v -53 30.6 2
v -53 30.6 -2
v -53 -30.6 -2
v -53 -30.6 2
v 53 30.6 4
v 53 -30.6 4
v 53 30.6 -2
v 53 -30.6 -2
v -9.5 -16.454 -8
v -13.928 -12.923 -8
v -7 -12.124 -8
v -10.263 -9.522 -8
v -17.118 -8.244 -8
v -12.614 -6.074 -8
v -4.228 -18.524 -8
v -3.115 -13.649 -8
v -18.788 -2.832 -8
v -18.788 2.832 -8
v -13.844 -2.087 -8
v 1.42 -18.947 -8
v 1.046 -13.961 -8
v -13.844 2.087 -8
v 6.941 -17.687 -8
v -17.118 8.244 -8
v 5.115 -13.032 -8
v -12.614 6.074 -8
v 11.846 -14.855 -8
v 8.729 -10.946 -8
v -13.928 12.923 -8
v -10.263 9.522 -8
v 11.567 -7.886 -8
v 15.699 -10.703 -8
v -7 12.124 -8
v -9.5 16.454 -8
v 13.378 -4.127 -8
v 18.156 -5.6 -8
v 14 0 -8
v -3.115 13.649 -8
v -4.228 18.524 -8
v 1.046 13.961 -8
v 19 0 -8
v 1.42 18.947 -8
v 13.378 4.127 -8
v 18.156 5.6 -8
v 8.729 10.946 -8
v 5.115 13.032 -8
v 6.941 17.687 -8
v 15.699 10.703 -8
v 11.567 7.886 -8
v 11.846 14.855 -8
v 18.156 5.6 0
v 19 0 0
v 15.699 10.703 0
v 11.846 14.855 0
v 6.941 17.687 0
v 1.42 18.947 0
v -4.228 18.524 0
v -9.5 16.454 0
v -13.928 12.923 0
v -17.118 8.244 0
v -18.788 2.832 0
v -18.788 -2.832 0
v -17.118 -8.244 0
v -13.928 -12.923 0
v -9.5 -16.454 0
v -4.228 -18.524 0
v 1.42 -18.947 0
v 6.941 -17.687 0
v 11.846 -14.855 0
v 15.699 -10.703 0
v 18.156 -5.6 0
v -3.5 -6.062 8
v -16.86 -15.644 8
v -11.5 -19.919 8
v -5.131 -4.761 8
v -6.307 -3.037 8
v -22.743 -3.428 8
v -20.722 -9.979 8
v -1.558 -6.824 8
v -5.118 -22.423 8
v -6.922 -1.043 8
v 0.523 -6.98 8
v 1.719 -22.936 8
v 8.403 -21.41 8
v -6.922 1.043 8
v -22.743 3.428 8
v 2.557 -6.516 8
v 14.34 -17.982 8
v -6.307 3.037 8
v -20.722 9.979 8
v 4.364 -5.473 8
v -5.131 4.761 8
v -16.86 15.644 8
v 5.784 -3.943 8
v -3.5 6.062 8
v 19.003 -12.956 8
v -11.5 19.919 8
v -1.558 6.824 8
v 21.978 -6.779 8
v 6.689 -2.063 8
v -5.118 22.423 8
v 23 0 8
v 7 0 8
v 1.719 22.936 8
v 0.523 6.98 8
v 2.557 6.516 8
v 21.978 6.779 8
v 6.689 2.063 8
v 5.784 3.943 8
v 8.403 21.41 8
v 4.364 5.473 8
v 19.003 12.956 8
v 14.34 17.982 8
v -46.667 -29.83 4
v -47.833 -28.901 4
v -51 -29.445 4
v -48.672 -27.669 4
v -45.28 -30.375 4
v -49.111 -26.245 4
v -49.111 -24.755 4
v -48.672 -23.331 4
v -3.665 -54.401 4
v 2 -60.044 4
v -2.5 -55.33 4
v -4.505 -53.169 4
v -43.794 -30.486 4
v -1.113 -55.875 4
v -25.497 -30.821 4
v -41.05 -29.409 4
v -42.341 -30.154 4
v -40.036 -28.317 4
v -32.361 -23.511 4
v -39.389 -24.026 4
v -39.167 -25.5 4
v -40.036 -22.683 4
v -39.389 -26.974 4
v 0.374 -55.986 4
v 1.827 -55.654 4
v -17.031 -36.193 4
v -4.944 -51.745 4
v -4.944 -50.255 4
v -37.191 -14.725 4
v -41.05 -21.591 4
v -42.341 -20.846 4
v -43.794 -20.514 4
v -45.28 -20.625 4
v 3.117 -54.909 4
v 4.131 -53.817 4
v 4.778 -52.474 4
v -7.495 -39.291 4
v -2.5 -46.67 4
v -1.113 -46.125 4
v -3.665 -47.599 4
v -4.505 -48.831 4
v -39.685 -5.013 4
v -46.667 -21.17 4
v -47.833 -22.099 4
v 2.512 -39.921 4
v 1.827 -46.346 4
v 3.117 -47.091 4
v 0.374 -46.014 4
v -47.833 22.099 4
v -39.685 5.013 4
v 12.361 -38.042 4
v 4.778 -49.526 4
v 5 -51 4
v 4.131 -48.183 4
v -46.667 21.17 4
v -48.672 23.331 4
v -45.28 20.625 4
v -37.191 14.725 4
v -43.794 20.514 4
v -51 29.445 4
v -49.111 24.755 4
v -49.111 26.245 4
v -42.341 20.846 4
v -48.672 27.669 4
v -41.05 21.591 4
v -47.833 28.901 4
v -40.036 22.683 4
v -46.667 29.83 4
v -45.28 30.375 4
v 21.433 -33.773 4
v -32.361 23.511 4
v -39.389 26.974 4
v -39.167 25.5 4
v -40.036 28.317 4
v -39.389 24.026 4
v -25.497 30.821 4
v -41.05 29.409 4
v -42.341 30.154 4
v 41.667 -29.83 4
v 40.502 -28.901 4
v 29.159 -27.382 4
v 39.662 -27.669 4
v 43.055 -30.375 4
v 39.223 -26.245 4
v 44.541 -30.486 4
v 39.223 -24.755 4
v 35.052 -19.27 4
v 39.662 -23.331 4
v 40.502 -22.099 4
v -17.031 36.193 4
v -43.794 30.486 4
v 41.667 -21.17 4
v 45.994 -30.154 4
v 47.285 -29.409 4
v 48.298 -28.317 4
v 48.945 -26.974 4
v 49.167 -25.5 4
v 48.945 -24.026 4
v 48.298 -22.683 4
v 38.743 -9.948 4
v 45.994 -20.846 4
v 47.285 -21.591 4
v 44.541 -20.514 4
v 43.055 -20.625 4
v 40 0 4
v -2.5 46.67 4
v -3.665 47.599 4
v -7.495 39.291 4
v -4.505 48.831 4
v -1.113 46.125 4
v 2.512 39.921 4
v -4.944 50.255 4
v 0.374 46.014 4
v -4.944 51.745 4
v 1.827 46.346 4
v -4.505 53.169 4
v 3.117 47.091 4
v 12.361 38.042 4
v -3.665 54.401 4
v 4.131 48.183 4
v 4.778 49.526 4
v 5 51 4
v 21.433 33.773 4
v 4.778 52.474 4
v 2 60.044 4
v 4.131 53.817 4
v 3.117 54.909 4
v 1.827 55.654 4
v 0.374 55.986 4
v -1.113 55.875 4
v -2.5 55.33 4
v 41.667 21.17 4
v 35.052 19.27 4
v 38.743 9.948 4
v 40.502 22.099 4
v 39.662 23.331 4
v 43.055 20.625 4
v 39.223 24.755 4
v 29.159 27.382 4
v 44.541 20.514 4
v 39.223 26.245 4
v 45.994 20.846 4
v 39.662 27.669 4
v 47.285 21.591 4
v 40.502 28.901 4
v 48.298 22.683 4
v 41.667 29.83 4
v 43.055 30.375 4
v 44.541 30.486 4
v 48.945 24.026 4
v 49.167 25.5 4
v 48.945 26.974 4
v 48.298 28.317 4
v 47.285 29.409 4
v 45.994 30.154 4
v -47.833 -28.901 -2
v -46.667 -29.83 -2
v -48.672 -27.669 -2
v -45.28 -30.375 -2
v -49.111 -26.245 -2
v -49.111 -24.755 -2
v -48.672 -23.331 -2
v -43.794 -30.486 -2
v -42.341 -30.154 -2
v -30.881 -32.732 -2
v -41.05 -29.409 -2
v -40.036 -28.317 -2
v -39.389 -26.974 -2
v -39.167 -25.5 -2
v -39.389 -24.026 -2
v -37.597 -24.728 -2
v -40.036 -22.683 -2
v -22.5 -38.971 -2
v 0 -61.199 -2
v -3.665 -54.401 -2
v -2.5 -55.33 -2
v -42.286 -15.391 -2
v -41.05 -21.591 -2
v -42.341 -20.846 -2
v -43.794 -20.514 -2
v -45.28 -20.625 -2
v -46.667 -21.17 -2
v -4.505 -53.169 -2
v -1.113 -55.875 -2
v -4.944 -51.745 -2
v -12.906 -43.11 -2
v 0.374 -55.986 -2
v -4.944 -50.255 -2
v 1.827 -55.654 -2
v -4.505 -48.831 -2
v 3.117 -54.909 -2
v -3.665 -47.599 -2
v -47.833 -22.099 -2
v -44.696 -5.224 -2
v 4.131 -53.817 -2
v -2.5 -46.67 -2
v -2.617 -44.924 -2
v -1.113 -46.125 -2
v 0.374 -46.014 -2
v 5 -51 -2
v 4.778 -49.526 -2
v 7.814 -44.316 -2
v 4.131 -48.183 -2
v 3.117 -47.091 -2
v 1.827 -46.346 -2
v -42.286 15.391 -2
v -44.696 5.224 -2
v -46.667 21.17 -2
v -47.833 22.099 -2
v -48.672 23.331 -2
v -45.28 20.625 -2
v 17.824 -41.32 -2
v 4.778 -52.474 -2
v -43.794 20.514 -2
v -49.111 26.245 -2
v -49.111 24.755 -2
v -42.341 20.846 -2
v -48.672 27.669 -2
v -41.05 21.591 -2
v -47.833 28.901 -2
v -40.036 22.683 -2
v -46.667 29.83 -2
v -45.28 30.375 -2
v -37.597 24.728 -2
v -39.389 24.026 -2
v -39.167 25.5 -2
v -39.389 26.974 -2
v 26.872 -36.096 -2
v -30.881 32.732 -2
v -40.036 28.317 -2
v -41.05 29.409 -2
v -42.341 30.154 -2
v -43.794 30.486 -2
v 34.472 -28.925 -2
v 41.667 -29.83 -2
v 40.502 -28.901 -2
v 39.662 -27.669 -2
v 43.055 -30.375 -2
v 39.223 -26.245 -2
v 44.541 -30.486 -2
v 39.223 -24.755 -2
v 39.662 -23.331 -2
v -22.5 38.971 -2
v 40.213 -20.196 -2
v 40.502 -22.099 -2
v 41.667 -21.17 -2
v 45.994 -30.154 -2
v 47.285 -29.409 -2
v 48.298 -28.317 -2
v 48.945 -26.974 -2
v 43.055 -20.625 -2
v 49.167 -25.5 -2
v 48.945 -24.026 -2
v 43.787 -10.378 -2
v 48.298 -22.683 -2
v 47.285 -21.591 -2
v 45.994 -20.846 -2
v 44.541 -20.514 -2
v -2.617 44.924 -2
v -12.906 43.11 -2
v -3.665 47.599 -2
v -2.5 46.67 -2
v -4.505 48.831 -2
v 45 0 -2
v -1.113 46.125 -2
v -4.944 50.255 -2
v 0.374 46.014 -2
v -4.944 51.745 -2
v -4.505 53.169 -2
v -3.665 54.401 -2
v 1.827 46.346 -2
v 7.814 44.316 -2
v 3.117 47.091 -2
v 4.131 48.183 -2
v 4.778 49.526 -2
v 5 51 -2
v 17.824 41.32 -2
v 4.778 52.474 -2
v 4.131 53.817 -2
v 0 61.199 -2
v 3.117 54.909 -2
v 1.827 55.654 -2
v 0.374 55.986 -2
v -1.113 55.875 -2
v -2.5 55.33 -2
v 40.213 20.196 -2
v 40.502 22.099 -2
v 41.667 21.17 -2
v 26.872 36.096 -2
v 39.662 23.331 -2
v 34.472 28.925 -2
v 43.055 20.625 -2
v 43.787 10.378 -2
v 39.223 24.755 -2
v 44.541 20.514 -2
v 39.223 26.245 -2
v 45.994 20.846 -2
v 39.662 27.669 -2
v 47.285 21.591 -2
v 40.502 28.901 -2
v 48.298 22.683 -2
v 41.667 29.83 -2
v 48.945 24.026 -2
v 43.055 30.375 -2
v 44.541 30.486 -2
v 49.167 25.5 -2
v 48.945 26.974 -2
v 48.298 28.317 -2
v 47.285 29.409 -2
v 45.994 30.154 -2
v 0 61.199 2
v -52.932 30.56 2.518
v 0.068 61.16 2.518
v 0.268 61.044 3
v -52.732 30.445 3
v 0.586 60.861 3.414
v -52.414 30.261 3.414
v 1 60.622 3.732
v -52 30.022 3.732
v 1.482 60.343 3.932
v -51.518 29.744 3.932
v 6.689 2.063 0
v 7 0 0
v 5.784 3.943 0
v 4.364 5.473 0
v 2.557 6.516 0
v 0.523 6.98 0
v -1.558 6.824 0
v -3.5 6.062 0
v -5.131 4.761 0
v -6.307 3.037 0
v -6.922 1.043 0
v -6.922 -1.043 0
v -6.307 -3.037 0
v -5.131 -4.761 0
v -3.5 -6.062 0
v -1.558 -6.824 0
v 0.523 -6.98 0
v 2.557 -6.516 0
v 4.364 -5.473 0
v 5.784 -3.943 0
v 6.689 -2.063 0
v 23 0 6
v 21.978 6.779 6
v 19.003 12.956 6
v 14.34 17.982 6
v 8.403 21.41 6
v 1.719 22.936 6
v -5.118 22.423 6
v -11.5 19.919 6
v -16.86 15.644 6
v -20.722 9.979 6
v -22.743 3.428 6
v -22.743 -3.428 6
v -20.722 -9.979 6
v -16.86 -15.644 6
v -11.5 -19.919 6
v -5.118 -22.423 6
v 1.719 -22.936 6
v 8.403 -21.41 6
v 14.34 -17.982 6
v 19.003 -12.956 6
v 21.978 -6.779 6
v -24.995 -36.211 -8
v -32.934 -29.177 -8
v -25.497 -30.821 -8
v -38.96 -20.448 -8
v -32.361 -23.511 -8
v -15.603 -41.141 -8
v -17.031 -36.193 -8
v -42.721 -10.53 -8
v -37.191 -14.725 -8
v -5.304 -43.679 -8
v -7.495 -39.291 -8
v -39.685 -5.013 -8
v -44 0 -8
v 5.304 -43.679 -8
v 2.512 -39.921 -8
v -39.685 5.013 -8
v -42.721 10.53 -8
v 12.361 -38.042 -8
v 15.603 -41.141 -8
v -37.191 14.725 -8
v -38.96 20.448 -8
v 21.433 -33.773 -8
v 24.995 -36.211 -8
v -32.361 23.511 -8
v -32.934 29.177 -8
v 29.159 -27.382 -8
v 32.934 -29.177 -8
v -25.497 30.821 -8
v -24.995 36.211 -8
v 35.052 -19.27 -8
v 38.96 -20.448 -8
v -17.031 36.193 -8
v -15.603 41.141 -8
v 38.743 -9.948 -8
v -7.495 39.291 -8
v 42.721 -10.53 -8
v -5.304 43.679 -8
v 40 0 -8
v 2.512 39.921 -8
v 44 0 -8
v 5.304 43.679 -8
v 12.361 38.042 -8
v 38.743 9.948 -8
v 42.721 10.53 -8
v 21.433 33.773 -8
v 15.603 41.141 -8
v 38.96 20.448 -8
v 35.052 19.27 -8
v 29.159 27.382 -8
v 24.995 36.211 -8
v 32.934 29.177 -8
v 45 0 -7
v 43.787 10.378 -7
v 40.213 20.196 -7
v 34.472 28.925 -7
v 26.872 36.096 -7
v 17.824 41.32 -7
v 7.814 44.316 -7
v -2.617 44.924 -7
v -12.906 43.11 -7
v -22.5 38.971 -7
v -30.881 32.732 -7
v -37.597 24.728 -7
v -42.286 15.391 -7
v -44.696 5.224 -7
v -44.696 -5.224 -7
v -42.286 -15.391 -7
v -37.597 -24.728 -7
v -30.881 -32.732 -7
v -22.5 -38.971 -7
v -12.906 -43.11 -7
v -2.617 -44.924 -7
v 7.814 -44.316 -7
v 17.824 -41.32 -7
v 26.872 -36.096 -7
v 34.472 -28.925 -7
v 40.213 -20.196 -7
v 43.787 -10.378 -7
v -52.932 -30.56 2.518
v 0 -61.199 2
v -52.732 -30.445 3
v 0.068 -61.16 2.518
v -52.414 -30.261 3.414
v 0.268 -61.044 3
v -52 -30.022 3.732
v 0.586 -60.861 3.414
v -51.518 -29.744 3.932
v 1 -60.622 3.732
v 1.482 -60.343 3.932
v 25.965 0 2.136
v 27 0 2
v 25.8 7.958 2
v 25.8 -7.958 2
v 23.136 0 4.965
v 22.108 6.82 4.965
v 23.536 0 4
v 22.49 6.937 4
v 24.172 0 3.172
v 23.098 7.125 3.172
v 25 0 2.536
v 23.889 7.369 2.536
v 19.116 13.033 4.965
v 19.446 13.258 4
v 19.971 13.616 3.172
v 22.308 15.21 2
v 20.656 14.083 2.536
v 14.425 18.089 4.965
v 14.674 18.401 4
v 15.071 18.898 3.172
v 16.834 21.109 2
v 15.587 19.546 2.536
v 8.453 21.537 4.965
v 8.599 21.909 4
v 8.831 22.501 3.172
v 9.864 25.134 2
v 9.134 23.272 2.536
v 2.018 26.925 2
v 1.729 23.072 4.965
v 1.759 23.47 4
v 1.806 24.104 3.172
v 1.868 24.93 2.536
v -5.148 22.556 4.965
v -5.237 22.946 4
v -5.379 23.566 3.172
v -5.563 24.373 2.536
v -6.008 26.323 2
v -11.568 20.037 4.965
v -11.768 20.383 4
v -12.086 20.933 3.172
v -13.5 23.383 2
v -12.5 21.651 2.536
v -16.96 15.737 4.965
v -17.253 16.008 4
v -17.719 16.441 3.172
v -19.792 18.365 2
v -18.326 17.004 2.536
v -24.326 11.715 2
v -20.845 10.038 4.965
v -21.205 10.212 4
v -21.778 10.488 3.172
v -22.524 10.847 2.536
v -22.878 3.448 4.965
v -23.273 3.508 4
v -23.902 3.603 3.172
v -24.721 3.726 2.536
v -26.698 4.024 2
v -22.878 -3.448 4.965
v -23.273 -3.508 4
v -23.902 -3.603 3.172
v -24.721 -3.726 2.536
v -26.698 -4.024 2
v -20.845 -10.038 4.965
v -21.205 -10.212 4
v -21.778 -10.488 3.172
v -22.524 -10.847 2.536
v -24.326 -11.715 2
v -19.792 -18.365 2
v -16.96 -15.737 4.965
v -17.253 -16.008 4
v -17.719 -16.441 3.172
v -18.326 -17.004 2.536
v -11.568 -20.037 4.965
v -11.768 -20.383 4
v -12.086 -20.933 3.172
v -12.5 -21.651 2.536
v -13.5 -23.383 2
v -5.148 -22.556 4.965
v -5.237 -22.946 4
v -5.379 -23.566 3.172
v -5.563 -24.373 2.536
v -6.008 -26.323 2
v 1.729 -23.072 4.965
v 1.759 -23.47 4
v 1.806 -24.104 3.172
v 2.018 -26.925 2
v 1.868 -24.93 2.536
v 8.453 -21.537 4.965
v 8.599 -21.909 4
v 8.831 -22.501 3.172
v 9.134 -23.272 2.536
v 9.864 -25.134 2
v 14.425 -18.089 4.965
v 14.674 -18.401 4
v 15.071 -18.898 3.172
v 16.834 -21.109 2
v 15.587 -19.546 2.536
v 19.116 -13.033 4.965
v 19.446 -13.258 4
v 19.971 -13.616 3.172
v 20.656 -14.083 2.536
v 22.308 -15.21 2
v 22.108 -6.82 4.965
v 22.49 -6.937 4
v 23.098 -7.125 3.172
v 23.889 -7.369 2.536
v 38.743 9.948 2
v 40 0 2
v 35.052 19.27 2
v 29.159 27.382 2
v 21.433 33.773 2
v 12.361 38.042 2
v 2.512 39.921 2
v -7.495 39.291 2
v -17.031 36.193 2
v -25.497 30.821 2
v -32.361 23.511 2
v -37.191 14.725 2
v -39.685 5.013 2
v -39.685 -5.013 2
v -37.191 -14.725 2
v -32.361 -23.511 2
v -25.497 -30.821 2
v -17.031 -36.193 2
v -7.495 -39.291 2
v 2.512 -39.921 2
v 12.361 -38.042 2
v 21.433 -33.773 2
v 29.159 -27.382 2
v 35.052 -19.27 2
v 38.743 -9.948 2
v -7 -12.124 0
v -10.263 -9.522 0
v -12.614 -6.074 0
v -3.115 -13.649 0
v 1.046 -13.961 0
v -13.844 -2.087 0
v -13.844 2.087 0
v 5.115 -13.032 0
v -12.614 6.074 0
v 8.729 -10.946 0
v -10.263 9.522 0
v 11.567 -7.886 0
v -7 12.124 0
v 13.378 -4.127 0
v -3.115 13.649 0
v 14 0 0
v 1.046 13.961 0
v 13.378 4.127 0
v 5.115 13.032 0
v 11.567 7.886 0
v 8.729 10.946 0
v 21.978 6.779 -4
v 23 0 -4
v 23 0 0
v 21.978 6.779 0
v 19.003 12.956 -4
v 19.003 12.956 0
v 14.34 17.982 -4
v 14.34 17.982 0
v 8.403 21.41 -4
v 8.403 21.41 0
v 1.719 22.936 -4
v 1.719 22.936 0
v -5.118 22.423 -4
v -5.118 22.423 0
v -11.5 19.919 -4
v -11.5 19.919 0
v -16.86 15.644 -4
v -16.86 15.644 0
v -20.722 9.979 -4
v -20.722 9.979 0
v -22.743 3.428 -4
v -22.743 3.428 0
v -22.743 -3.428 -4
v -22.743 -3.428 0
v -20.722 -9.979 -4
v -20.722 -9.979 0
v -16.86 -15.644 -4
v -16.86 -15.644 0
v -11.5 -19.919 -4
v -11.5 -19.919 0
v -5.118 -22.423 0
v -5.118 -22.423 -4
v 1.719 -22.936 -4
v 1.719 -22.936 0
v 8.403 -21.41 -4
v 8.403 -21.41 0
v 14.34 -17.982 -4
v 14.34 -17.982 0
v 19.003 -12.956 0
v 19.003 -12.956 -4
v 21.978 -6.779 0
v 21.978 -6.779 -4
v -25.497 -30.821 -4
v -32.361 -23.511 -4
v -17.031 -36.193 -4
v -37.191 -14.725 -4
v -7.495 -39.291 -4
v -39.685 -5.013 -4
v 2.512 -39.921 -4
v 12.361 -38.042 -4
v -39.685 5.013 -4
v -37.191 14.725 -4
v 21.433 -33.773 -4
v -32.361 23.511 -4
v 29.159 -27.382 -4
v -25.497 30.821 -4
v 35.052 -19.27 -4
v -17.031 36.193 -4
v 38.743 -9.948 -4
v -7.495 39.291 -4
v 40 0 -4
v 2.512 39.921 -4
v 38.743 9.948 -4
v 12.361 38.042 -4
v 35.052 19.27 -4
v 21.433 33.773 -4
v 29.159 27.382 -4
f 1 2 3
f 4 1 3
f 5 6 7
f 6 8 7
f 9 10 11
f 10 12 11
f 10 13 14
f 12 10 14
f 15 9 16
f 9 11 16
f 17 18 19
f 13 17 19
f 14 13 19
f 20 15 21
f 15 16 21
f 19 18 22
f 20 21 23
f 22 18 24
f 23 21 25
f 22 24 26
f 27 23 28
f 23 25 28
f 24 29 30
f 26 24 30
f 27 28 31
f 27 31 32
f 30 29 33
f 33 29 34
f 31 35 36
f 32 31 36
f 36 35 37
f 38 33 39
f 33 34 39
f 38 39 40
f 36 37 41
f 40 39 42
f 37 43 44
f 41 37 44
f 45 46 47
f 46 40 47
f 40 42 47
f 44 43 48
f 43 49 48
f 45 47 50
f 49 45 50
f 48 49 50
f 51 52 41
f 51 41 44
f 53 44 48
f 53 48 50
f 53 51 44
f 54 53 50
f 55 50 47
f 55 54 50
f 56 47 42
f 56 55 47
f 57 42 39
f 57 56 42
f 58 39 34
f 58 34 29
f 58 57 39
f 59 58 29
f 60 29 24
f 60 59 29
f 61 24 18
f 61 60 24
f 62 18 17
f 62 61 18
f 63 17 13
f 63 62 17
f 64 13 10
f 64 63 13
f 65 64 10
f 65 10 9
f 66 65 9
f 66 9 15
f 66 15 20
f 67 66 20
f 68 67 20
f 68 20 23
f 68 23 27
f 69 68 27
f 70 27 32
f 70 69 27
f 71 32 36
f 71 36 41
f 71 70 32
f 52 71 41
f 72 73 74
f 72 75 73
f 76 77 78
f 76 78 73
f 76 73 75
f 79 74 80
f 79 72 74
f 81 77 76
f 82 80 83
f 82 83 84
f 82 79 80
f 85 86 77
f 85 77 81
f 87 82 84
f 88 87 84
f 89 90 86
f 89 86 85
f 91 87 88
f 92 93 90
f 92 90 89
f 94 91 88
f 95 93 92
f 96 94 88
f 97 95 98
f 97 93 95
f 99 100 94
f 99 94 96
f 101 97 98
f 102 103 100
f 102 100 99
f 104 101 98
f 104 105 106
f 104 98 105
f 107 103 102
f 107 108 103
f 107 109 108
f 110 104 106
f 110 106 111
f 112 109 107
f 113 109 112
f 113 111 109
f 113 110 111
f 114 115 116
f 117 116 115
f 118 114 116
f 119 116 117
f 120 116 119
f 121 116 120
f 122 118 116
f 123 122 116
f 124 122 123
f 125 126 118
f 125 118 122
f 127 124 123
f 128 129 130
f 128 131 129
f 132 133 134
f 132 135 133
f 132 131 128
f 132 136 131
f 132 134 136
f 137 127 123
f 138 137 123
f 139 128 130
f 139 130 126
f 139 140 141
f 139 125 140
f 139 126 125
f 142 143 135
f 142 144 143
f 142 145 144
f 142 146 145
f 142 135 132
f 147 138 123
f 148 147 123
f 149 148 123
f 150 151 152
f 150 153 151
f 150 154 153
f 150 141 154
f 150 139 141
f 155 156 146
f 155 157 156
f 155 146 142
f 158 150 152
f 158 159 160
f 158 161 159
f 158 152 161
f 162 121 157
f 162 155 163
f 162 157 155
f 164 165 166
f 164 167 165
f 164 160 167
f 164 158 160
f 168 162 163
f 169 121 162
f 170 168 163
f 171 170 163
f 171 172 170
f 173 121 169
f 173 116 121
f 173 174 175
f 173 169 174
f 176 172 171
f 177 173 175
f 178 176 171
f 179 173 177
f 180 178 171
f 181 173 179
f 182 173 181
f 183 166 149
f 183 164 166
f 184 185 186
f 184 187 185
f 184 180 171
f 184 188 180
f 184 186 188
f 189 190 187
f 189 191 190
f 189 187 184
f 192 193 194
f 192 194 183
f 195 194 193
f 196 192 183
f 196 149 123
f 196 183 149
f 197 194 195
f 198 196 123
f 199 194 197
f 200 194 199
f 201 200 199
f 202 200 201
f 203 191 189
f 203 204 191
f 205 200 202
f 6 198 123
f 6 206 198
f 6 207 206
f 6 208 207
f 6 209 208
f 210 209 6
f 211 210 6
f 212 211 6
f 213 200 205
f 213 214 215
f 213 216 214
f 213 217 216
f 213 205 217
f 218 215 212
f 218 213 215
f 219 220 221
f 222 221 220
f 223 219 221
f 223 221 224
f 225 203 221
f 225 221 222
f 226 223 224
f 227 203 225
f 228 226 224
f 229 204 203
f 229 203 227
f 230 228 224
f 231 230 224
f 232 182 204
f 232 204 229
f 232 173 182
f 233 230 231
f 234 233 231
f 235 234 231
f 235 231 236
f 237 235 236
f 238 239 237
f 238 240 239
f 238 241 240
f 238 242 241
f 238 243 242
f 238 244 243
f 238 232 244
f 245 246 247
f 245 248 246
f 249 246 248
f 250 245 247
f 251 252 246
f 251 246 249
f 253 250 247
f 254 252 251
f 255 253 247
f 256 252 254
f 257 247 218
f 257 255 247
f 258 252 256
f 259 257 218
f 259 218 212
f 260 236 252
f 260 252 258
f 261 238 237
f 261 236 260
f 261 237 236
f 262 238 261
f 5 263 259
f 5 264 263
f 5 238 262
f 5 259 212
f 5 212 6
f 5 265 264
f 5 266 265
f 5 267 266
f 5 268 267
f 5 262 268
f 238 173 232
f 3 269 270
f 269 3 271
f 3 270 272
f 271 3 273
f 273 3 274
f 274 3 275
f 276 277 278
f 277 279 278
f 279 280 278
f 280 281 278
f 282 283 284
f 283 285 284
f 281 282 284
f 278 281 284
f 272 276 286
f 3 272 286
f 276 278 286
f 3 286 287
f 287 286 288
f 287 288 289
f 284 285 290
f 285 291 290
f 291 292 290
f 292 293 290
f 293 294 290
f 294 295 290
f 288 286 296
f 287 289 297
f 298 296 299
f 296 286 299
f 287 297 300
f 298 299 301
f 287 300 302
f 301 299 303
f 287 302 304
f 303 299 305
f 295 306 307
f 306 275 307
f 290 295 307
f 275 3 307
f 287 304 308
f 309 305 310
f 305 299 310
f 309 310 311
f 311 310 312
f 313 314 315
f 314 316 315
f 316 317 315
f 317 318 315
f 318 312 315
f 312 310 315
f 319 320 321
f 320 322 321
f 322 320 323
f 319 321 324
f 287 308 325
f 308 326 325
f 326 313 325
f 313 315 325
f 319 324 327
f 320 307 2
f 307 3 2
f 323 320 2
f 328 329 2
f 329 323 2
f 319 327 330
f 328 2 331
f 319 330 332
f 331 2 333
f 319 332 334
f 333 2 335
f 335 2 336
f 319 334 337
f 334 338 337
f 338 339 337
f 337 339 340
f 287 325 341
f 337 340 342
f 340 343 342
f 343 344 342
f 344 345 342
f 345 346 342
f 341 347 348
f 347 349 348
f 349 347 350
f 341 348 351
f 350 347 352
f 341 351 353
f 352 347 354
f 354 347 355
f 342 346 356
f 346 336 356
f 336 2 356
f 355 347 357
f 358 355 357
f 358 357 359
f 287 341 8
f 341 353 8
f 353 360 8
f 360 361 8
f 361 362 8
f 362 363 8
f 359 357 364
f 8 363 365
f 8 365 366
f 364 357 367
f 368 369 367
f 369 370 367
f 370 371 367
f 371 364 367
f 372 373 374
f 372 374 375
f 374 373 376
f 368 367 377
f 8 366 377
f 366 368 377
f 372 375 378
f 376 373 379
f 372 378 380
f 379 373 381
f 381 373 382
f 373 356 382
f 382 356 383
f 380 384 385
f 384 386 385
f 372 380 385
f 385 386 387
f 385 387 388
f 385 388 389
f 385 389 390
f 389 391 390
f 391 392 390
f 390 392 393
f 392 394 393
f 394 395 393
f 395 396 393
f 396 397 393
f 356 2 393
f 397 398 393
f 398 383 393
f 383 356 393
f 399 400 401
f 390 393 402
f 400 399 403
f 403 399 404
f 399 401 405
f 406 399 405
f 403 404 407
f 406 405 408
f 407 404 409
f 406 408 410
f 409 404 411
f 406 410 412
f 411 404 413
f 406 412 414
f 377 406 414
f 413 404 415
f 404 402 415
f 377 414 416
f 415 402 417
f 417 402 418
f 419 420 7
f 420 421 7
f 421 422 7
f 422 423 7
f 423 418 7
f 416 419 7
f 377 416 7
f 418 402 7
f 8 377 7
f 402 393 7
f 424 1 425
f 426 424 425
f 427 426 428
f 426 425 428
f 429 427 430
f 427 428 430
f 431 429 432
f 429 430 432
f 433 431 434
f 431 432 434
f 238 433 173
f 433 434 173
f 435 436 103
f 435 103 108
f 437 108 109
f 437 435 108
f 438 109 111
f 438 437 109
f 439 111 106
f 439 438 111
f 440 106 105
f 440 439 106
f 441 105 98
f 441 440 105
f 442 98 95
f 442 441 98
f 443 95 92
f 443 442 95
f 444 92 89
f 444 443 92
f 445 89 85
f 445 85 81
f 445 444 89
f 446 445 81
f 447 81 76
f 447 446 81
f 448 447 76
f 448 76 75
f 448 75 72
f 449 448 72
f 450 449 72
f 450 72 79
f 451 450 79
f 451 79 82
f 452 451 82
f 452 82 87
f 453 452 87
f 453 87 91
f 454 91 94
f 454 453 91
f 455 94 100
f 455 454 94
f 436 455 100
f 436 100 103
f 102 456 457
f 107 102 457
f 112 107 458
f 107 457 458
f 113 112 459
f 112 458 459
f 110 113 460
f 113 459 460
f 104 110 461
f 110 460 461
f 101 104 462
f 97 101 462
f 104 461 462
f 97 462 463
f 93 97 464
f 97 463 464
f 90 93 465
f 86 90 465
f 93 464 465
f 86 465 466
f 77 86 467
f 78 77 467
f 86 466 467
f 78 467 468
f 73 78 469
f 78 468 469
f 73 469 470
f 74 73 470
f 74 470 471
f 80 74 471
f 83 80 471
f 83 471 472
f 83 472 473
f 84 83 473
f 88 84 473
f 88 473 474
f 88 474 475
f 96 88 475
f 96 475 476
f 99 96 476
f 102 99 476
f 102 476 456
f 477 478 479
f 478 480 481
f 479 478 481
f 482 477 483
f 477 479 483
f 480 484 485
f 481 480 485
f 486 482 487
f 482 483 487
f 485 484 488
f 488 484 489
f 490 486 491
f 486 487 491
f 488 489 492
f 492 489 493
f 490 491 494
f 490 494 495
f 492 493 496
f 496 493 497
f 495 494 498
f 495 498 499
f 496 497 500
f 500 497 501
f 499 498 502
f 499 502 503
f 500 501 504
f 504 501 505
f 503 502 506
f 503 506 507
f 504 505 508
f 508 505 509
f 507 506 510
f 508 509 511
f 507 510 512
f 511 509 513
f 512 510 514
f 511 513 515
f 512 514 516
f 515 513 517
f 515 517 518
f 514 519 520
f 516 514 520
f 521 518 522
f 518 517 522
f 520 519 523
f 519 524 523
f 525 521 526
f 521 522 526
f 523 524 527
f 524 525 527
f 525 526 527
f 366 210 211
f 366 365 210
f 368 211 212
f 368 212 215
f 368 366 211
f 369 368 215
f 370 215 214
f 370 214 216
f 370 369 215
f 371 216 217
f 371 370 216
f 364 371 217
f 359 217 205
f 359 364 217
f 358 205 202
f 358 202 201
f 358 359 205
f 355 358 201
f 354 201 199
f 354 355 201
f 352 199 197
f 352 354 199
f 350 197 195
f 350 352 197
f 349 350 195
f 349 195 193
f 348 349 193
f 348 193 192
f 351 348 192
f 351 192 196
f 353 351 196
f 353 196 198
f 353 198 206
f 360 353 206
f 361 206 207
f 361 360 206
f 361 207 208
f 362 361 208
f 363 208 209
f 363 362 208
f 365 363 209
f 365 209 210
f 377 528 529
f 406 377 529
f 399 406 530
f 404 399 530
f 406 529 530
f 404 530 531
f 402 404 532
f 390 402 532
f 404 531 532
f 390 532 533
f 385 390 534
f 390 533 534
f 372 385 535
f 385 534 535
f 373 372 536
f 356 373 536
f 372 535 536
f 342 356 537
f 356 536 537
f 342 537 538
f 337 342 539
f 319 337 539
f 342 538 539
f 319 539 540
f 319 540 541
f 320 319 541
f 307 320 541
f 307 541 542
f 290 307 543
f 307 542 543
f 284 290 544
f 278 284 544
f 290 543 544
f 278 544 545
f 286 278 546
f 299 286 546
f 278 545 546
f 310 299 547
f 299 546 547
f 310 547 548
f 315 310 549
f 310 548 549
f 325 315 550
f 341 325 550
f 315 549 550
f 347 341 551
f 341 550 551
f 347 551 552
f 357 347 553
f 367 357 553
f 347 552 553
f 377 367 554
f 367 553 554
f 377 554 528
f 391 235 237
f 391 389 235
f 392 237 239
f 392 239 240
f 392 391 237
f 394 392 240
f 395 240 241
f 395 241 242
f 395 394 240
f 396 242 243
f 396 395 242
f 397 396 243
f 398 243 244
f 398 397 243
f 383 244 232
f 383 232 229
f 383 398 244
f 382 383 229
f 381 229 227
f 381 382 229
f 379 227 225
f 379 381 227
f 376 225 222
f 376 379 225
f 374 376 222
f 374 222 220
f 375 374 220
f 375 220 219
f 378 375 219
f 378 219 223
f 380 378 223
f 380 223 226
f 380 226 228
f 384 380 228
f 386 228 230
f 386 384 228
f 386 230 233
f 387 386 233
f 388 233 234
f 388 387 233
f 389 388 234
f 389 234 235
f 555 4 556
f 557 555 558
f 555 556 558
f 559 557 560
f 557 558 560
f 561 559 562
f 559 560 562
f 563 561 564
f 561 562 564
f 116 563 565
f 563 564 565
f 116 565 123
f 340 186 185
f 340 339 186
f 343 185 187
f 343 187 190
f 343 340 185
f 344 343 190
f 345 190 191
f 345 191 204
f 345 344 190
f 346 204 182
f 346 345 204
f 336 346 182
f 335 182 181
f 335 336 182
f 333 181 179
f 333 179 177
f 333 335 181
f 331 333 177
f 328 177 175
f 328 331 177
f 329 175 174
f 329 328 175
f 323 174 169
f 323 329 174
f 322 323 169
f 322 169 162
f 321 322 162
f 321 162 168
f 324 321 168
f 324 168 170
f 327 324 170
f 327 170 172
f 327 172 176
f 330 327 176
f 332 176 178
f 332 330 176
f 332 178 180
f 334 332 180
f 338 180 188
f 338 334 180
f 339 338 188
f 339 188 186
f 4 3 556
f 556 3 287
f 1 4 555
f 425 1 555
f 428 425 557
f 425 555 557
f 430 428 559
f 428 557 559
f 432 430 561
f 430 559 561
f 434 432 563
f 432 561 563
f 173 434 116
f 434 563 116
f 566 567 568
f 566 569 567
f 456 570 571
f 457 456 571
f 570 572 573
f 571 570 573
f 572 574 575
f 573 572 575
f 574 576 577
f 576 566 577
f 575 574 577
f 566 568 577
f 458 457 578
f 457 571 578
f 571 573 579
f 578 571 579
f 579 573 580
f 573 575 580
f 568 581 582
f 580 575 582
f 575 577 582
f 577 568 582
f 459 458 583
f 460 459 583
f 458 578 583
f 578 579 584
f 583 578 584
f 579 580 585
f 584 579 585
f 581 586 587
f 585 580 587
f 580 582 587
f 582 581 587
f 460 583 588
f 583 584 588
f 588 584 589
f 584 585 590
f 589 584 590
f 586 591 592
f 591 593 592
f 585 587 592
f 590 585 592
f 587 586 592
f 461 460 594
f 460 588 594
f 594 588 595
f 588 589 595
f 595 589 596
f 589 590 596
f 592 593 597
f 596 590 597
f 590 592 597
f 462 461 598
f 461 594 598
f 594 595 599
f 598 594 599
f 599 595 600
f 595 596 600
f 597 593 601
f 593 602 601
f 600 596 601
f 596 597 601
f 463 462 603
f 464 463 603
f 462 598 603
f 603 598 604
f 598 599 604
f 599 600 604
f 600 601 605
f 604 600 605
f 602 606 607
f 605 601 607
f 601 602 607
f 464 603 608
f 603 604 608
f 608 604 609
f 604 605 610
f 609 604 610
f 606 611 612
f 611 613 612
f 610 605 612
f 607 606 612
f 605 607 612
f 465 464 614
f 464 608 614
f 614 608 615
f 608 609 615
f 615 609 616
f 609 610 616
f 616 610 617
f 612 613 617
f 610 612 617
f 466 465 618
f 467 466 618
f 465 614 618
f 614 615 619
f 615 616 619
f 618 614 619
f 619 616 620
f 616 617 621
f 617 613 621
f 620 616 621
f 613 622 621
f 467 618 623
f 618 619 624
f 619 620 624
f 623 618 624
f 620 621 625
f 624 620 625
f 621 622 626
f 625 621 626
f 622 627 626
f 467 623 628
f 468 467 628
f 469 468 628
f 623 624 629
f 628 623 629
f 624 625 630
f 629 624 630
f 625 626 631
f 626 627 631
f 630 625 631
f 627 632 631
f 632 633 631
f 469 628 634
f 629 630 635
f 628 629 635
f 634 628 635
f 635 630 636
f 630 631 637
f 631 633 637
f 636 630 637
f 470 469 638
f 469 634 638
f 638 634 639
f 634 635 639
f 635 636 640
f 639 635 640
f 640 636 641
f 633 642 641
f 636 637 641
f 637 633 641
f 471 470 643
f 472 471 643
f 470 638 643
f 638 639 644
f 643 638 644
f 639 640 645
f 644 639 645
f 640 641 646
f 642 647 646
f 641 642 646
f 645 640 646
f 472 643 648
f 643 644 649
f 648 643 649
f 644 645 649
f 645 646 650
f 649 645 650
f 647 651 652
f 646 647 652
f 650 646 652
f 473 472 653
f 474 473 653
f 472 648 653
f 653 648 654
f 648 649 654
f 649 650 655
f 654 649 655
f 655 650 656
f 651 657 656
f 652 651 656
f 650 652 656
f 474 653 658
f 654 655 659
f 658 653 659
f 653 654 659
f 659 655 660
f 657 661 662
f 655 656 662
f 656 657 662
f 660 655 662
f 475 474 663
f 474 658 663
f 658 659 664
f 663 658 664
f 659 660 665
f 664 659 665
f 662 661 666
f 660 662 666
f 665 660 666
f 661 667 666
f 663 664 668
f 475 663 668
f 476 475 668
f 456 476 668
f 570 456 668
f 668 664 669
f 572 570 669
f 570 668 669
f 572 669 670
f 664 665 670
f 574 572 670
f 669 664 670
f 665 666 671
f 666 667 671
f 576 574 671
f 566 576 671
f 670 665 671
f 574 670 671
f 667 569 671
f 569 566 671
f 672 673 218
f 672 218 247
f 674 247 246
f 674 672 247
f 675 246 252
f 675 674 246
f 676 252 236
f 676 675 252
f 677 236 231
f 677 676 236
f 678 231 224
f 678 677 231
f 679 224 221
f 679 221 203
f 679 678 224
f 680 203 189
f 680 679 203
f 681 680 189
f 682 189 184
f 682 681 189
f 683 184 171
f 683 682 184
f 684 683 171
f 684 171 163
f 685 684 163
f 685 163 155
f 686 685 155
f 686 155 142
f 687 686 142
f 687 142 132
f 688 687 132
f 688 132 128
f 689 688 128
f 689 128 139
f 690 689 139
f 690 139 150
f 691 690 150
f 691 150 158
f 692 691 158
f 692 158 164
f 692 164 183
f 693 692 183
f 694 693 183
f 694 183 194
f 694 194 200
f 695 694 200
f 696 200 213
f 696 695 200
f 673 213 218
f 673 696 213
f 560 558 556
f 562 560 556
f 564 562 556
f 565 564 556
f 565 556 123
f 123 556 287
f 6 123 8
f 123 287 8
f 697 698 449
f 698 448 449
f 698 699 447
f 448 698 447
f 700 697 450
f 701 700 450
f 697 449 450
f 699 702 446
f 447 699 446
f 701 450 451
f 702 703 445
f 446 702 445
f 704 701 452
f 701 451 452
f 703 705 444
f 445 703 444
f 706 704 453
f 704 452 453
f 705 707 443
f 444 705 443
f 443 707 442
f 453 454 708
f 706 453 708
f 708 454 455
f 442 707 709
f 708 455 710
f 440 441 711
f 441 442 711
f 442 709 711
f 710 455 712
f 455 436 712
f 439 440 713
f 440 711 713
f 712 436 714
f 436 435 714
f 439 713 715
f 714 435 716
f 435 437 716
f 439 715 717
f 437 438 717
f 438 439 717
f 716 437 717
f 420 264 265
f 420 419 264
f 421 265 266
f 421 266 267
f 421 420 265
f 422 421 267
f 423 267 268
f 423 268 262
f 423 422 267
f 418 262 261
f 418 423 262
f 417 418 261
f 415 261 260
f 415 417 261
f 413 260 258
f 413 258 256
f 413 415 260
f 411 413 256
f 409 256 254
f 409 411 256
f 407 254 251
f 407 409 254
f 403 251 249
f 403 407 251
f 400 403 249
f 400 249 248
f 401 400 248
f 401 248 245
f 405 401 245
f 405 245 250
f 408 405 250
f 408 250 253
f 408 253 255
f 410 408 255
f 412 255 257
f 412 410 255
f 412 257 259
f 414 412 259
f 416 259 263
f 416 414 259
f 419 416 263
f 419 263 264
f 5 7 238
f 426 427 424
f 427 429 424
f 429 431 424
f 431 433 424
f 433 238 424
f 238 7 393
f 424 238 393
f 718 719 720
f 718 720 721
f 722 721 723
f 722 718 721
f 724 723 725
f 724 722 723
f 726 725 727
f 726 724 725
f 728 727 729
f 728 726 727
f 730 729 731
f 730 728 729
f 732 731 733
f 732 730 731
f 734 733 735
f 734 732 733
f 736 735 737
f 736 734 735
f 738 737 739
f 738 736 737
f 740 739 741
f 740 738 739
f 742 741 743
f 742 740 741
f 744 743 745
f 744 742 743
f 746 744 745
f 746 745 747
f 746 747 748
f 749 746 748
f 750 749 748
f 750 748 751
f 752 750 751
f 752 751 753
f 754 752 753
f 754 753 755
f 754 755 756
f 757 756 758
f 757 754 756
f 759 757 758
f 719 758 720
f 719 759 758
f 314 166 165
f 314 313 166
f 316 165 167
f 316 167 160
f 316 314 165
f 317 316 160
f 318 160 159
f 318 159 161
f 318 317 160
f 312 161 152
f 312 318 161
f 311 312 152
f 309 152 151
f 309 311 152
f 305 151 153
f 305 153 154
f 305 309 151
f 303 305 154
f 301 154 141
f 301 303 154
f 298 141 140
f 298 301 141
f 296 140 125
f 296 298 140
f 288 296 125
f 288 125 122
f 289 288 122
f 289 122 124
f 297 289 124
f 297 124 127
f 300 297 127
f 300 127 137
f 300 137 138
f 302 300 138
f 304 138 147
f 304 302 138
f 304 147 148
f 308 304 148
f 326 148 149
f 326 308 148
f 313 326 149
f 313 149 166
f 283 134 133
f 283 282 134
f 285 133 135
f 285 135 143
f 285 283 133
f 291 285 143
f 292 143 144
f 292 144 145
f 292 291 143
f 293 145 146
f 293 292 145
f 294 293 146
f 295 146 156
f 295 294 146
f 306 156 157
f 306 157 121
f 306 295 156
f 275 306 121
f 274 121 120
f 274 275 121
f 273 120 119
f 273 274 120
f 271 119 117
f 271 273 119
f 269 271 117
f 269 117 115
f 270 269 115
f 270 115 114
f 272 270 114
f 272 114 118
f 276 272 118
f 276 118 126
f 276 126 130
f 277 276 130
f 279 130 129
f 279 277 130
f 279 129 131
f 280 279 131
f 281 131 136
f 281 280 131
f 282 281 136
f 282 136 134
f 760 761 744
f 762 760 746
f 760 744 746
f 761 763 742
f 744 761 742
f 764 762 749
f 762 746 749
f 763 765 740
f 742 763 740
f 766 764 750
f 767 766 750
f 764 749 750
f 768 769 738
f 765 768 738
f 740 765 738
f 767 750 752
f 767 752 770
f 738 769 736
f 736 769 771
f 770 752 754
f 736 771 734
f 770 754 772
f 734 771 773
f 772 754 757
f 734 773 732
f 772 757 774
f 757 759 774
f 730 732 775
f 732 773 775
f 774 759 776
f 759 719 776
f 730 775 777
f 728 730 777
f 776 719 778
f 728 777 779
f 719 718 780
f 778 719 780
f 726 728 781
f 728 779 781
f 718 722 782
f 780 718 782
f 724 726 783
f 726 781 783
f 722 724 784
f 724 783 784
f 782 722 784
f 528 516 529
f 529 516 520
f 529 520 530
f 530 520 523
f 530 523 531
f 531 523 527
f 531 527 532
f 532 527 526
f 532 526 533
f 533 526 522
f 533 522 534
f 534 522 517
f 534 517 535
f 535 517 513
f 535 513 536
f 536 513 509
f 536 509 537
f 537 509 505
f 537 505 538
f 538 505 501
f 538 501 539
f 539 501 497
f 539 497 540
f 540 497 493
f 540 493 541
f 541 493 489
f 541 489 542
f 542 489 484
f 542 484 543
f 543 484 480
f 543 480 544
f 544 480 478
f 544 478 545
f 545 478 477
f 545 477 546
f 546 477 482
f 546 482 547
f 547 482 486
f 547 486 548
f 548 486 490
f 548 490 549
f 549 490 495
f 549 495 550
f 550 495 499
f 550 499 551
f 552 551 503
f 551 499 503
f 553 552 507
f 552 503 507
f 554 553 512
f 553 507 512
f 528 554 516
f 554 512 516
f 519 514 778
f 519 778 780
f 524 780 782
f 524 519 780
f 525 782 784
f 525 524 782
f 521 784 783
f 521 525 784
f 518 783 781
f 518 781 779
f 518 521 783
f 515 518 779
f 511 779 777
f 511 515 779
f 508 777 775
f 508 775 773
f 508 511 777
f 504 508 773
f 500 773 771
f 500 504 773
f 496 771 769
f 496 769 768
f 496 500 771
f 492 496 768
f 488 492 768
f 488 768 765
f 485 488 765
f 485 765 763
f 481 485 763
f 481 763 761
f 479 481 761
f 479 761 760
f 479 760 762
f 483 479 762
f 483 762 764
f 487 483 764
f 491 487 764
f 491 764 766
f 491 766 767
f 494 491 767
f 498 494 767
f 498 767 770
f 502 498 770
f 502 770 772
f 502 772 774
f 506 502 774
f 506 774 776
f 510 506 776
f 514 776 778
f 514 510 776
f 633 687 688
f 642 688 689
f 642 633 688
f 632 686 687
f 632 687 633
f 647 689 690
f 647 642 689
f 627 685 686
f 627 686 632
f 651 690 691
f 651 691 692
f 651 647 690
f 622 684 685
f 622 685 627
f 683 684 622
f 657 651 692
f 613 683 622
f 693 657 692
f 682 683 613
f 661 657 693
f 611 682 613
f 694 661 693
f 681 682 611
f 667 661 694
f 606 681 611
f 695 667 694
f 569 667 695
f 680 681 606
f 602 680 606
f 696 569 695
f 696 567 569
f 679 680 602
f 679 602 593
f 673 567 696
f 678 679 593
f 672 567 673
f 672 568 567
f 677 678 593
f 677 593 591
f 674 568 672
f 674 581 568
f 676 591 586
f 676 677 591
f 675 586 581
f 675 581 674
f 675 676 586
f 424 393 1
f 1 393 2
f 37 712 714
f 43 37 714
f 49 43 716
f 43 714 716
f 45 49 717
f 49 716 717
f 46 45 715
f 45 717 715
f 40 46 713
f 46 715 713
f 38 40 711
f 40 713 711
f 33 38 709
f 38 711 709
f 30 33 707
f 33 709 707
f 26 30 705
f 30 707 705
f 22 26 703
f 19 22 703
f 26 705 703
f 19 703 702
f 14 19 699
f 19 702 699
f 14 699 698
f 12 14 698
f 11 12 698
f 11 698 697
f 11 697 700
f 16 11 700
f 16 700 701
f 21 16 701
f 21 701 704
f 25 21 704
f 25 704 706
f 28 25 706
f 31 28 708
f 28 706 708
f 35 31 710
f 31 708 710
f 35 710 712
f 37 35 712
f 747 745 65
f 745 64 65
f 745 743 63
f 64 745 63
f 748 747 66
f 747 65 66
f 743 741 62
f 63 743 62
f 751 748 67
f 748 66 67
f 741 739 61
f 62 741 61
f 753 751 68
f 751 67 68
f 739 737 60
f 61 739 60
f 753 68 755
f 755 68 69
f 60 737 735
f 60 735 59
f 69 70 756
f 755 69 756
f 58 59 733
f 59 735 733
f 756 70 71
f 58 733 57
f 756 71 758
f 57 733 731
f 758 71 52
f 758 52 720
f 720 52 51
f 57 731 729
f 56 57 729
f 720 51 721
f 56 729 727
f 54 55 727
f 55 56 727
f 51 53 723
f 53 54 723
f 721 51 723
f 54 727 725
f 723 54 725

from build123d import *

# Parameters (mm, degrees)
SKETCH1_R            = 14
SKETCH1_R_2          = 7
BOSS_EXTRUDE1_DEPTH  = 8
SKETCH1_3_R          = 23
SKETCH1_3_R_2        = 14
BOSS_EXTRUDE2_DEPTH  = 8
SKETCH1_4_R          = 19
SKETCH1_4_R_2        = 14
BOSS_EXTRUDE3_DEPTH  = 8
SKETCH1_5_R          = 40
SKETCH1_5_R_2        = 23
BOSS_EXTRUDE4_DEPTH  = 2
BOSS_EXTRUDE5_START  = -4
SKETCH1_6_R          = 40
SKETCH1_6_R_2        = 23
BOSS_EXTRUDE5_DEPTH  = 4
BOSS_EXTRUDE6_START  = -8
SKETCH1_8_R          = 45
SKETCH1_8_R_2        = 40
BOSS_EXTRUDE6_DEPTH  = 8
SKETCH1_9_R          = 45
SKETCH1_9_R_2        = 40
BOSS_EXTRUDE7_DEPTH  = 4
BOSS_EXTRUDE8_START  = -2
SKETCH1_10_R         = 5
SKETCH1_10_R_2       = 45
BOSS_EXTRUDE8_DEPTH  = 2
SKETCH1_12_R         = 5
SKETCH1_12_R_2       = 45
BOSS_EXTRUDE10_DEPTH = 4
FILLET1_R            = 4
CHAMFER1_SIZE        = 1
FILLET2_R            = 2


with BuildPart() as part:
    # Sketch1 → Boss-Extrude1 (new body)
    with BuildSketch(Plane.XY):
        Circle(SKETCH1_R)
        Circle(SKETCH1_R_2, mode=Mode.SUBTRACT)
    extrude(amount=BOSS_EXTRUDE1_DEPTH)

    # Sketch1<3> → Boss-Extrude2 (add)
    with BuildSketch(Plane.XY):
        Circle(SKETCH1_3_R)
        Circle(SKETCH1_3_R_2, mode=Mode.SUBTRACT)
    extrude(amount=BOSS_EXTRUDE2_DEPTH)

    # Sketch1<4> → Boss-Extrude3 (add)
    with BuildSketch(Plane.XY):
        Circle(SKETCH1_4_R)
        Circle(SKETCH1_4_R_2, mode=Mode.SUBTRACT)
    extrude(amount=-BOSS_EXTRUDE3_DEPTH)

    # Sketch1<5> → Boss-Extrude4 (add)
    with BuildSketch(Plane.XY):
        Circle(SKETCH1_5_R)
        Circle(SKETCH1_5_R_2, mode=Mode.SUBTRACT)
    extrude(amount=BOSS_EXTRUDE4_DEPTH)

    # Sketch1<6> → Boss-Extrude5 (add)
    with BuildSketch(Plane.XY.offset(BOSS_EXTRUDE5_START)):
        Circle(SKETCH1_6_R)
        Circle(SKETCH1_6_R_2, mode=Mode.SUBTRACT)
    extrude(amount=BOSS_EXTRUDE5_DEPTH)

    # Sketch1<8> → Boss-Extrude6 (add)
    with BuildSketch(Plane.XY.offset(BOSS_EXTRUDE6_START)):
        Circle(SKETCH1_8_R)
        Circle(SKETCH1_8_R_2, mode=Mode.SUBTRACT)
    extrude(amount=BOSS_EXTRUDE6_DEPTH)

    # Sketch1<9> → Boss-Extrude7 (add)
    with BuildSketch(Plane.XY):
        Circle(SKETCH1_9_R)
        Circle(SKETCH1_9_R_2, mode=Mode.SUBTRACT)
    extrude(amount=BOSS_EXTRUDE7_DEPTH)

    # Sketch1<10> → Boss-Extrude8 (add)
    with BuildSketch(Plane.XY.offset(BOSS_EXTRUDE8_START)):
        Polygon((0, -61.199128534), (53, -30.599564267), (53, 30.599564267), (0, 61.199128534), (-53, 30.599564267), (-53, -30.599564267), align=None)
        with Locations((-44.167295593, -25.5)):
            Circle(SKETCH1_10_R, mode=Mode.SUBTRACT)
        with Locations((0, -51)):
            Circle(SKETCH1_10_R, mode=Mode.SUBTRACT)
        with Locations((44.167295593, -25.5)):
            Circle(SKETCH1_10_R, mode=Mode.SUBTRACT)
        with Locations((-44.167295593, 25.5)):
            Circle(SKETCH1_10_R, mode=Mode.SUBTRACT)
        Circle(SKETCH1_10_R_2, mode=Mode.SUBTRACT)
        with Locations((44.167295593, 25.5)):
            Circle(SKETCH1_10_R, mode=Mode.SUBTRACT)
        with Locations((0, 51)):
            Circle(SKETCH1_10_R, mode=Mode.SUBTRACT)
    extrude(amount=BOSS_EXTRUDE8_DEPTH)

    # Sketch1<12> → Boss-Extrude10 (add)
    with BuildSketch(Plane.XY):
        Polygon((0, -61.199128534), (53, -30.599564267), (53, 30.599564267), (0, 61.199128534), (-53, 30.599564267), (-53, -30.599564267), align=None)
        with Locations((-44.167295593, -25.5)):
            Circle(SKETCH1_12_R, mode=Mode.SUBTRACT)
        with Locations((0, -51)):
            Circle(SKETCH1_12_R, mode=Mode.SUBTRACT)
        with Locations((44.167295593, -25.5)):
            Circle(SKETCH1_12_R, mode=Mode.SUBTRACT)
        with Locations((-44.167295593, 25.5)):
            Circle(SKETCH1_12_R, mode=Mode.SUBTRACT)
        Circle(SKETCH1_12_R_2, mode=Mode.SUBTRACT)
        with Locations((44.167295593, 25.5)):
            Circle(SKETCH1_12_R, mode=Mode.SUBTRACT)
        with Locations((0, 51)):
            Circle(SKETCH1_12_R, mode=Mode.SUBTRACT)
    extrude(amount=BOSS_EXTRUDE10_DEPTH)

    # Fillet1
    fillet1_edges = [part.edges().sort_by_distance(p)[0] for p in [
        (-23, 0, 2),
    ]]
    fillet(fillet1_edges, radius=FILLET1_R)

    # Chamfer1
    chamfer1_edges = [part.edges().sort_by_distance(p)[0] for p in [
        (-45, 0, -8),
    ]]
    chamfer(chamfer1_edges, length=CHAMFER1_SIZE)

    # Fillet2
    fillet2_edges = [part.edges().sort_by_distance(p)[0] for p in [
        (-26.5, 45.899346401, 4),
        (-53, 0, 4),
        (-26.5, -45.899346401, 4),
    ]]
    fillet(fillet2_edges, radius=FILLET2_R)


solid = part.part
